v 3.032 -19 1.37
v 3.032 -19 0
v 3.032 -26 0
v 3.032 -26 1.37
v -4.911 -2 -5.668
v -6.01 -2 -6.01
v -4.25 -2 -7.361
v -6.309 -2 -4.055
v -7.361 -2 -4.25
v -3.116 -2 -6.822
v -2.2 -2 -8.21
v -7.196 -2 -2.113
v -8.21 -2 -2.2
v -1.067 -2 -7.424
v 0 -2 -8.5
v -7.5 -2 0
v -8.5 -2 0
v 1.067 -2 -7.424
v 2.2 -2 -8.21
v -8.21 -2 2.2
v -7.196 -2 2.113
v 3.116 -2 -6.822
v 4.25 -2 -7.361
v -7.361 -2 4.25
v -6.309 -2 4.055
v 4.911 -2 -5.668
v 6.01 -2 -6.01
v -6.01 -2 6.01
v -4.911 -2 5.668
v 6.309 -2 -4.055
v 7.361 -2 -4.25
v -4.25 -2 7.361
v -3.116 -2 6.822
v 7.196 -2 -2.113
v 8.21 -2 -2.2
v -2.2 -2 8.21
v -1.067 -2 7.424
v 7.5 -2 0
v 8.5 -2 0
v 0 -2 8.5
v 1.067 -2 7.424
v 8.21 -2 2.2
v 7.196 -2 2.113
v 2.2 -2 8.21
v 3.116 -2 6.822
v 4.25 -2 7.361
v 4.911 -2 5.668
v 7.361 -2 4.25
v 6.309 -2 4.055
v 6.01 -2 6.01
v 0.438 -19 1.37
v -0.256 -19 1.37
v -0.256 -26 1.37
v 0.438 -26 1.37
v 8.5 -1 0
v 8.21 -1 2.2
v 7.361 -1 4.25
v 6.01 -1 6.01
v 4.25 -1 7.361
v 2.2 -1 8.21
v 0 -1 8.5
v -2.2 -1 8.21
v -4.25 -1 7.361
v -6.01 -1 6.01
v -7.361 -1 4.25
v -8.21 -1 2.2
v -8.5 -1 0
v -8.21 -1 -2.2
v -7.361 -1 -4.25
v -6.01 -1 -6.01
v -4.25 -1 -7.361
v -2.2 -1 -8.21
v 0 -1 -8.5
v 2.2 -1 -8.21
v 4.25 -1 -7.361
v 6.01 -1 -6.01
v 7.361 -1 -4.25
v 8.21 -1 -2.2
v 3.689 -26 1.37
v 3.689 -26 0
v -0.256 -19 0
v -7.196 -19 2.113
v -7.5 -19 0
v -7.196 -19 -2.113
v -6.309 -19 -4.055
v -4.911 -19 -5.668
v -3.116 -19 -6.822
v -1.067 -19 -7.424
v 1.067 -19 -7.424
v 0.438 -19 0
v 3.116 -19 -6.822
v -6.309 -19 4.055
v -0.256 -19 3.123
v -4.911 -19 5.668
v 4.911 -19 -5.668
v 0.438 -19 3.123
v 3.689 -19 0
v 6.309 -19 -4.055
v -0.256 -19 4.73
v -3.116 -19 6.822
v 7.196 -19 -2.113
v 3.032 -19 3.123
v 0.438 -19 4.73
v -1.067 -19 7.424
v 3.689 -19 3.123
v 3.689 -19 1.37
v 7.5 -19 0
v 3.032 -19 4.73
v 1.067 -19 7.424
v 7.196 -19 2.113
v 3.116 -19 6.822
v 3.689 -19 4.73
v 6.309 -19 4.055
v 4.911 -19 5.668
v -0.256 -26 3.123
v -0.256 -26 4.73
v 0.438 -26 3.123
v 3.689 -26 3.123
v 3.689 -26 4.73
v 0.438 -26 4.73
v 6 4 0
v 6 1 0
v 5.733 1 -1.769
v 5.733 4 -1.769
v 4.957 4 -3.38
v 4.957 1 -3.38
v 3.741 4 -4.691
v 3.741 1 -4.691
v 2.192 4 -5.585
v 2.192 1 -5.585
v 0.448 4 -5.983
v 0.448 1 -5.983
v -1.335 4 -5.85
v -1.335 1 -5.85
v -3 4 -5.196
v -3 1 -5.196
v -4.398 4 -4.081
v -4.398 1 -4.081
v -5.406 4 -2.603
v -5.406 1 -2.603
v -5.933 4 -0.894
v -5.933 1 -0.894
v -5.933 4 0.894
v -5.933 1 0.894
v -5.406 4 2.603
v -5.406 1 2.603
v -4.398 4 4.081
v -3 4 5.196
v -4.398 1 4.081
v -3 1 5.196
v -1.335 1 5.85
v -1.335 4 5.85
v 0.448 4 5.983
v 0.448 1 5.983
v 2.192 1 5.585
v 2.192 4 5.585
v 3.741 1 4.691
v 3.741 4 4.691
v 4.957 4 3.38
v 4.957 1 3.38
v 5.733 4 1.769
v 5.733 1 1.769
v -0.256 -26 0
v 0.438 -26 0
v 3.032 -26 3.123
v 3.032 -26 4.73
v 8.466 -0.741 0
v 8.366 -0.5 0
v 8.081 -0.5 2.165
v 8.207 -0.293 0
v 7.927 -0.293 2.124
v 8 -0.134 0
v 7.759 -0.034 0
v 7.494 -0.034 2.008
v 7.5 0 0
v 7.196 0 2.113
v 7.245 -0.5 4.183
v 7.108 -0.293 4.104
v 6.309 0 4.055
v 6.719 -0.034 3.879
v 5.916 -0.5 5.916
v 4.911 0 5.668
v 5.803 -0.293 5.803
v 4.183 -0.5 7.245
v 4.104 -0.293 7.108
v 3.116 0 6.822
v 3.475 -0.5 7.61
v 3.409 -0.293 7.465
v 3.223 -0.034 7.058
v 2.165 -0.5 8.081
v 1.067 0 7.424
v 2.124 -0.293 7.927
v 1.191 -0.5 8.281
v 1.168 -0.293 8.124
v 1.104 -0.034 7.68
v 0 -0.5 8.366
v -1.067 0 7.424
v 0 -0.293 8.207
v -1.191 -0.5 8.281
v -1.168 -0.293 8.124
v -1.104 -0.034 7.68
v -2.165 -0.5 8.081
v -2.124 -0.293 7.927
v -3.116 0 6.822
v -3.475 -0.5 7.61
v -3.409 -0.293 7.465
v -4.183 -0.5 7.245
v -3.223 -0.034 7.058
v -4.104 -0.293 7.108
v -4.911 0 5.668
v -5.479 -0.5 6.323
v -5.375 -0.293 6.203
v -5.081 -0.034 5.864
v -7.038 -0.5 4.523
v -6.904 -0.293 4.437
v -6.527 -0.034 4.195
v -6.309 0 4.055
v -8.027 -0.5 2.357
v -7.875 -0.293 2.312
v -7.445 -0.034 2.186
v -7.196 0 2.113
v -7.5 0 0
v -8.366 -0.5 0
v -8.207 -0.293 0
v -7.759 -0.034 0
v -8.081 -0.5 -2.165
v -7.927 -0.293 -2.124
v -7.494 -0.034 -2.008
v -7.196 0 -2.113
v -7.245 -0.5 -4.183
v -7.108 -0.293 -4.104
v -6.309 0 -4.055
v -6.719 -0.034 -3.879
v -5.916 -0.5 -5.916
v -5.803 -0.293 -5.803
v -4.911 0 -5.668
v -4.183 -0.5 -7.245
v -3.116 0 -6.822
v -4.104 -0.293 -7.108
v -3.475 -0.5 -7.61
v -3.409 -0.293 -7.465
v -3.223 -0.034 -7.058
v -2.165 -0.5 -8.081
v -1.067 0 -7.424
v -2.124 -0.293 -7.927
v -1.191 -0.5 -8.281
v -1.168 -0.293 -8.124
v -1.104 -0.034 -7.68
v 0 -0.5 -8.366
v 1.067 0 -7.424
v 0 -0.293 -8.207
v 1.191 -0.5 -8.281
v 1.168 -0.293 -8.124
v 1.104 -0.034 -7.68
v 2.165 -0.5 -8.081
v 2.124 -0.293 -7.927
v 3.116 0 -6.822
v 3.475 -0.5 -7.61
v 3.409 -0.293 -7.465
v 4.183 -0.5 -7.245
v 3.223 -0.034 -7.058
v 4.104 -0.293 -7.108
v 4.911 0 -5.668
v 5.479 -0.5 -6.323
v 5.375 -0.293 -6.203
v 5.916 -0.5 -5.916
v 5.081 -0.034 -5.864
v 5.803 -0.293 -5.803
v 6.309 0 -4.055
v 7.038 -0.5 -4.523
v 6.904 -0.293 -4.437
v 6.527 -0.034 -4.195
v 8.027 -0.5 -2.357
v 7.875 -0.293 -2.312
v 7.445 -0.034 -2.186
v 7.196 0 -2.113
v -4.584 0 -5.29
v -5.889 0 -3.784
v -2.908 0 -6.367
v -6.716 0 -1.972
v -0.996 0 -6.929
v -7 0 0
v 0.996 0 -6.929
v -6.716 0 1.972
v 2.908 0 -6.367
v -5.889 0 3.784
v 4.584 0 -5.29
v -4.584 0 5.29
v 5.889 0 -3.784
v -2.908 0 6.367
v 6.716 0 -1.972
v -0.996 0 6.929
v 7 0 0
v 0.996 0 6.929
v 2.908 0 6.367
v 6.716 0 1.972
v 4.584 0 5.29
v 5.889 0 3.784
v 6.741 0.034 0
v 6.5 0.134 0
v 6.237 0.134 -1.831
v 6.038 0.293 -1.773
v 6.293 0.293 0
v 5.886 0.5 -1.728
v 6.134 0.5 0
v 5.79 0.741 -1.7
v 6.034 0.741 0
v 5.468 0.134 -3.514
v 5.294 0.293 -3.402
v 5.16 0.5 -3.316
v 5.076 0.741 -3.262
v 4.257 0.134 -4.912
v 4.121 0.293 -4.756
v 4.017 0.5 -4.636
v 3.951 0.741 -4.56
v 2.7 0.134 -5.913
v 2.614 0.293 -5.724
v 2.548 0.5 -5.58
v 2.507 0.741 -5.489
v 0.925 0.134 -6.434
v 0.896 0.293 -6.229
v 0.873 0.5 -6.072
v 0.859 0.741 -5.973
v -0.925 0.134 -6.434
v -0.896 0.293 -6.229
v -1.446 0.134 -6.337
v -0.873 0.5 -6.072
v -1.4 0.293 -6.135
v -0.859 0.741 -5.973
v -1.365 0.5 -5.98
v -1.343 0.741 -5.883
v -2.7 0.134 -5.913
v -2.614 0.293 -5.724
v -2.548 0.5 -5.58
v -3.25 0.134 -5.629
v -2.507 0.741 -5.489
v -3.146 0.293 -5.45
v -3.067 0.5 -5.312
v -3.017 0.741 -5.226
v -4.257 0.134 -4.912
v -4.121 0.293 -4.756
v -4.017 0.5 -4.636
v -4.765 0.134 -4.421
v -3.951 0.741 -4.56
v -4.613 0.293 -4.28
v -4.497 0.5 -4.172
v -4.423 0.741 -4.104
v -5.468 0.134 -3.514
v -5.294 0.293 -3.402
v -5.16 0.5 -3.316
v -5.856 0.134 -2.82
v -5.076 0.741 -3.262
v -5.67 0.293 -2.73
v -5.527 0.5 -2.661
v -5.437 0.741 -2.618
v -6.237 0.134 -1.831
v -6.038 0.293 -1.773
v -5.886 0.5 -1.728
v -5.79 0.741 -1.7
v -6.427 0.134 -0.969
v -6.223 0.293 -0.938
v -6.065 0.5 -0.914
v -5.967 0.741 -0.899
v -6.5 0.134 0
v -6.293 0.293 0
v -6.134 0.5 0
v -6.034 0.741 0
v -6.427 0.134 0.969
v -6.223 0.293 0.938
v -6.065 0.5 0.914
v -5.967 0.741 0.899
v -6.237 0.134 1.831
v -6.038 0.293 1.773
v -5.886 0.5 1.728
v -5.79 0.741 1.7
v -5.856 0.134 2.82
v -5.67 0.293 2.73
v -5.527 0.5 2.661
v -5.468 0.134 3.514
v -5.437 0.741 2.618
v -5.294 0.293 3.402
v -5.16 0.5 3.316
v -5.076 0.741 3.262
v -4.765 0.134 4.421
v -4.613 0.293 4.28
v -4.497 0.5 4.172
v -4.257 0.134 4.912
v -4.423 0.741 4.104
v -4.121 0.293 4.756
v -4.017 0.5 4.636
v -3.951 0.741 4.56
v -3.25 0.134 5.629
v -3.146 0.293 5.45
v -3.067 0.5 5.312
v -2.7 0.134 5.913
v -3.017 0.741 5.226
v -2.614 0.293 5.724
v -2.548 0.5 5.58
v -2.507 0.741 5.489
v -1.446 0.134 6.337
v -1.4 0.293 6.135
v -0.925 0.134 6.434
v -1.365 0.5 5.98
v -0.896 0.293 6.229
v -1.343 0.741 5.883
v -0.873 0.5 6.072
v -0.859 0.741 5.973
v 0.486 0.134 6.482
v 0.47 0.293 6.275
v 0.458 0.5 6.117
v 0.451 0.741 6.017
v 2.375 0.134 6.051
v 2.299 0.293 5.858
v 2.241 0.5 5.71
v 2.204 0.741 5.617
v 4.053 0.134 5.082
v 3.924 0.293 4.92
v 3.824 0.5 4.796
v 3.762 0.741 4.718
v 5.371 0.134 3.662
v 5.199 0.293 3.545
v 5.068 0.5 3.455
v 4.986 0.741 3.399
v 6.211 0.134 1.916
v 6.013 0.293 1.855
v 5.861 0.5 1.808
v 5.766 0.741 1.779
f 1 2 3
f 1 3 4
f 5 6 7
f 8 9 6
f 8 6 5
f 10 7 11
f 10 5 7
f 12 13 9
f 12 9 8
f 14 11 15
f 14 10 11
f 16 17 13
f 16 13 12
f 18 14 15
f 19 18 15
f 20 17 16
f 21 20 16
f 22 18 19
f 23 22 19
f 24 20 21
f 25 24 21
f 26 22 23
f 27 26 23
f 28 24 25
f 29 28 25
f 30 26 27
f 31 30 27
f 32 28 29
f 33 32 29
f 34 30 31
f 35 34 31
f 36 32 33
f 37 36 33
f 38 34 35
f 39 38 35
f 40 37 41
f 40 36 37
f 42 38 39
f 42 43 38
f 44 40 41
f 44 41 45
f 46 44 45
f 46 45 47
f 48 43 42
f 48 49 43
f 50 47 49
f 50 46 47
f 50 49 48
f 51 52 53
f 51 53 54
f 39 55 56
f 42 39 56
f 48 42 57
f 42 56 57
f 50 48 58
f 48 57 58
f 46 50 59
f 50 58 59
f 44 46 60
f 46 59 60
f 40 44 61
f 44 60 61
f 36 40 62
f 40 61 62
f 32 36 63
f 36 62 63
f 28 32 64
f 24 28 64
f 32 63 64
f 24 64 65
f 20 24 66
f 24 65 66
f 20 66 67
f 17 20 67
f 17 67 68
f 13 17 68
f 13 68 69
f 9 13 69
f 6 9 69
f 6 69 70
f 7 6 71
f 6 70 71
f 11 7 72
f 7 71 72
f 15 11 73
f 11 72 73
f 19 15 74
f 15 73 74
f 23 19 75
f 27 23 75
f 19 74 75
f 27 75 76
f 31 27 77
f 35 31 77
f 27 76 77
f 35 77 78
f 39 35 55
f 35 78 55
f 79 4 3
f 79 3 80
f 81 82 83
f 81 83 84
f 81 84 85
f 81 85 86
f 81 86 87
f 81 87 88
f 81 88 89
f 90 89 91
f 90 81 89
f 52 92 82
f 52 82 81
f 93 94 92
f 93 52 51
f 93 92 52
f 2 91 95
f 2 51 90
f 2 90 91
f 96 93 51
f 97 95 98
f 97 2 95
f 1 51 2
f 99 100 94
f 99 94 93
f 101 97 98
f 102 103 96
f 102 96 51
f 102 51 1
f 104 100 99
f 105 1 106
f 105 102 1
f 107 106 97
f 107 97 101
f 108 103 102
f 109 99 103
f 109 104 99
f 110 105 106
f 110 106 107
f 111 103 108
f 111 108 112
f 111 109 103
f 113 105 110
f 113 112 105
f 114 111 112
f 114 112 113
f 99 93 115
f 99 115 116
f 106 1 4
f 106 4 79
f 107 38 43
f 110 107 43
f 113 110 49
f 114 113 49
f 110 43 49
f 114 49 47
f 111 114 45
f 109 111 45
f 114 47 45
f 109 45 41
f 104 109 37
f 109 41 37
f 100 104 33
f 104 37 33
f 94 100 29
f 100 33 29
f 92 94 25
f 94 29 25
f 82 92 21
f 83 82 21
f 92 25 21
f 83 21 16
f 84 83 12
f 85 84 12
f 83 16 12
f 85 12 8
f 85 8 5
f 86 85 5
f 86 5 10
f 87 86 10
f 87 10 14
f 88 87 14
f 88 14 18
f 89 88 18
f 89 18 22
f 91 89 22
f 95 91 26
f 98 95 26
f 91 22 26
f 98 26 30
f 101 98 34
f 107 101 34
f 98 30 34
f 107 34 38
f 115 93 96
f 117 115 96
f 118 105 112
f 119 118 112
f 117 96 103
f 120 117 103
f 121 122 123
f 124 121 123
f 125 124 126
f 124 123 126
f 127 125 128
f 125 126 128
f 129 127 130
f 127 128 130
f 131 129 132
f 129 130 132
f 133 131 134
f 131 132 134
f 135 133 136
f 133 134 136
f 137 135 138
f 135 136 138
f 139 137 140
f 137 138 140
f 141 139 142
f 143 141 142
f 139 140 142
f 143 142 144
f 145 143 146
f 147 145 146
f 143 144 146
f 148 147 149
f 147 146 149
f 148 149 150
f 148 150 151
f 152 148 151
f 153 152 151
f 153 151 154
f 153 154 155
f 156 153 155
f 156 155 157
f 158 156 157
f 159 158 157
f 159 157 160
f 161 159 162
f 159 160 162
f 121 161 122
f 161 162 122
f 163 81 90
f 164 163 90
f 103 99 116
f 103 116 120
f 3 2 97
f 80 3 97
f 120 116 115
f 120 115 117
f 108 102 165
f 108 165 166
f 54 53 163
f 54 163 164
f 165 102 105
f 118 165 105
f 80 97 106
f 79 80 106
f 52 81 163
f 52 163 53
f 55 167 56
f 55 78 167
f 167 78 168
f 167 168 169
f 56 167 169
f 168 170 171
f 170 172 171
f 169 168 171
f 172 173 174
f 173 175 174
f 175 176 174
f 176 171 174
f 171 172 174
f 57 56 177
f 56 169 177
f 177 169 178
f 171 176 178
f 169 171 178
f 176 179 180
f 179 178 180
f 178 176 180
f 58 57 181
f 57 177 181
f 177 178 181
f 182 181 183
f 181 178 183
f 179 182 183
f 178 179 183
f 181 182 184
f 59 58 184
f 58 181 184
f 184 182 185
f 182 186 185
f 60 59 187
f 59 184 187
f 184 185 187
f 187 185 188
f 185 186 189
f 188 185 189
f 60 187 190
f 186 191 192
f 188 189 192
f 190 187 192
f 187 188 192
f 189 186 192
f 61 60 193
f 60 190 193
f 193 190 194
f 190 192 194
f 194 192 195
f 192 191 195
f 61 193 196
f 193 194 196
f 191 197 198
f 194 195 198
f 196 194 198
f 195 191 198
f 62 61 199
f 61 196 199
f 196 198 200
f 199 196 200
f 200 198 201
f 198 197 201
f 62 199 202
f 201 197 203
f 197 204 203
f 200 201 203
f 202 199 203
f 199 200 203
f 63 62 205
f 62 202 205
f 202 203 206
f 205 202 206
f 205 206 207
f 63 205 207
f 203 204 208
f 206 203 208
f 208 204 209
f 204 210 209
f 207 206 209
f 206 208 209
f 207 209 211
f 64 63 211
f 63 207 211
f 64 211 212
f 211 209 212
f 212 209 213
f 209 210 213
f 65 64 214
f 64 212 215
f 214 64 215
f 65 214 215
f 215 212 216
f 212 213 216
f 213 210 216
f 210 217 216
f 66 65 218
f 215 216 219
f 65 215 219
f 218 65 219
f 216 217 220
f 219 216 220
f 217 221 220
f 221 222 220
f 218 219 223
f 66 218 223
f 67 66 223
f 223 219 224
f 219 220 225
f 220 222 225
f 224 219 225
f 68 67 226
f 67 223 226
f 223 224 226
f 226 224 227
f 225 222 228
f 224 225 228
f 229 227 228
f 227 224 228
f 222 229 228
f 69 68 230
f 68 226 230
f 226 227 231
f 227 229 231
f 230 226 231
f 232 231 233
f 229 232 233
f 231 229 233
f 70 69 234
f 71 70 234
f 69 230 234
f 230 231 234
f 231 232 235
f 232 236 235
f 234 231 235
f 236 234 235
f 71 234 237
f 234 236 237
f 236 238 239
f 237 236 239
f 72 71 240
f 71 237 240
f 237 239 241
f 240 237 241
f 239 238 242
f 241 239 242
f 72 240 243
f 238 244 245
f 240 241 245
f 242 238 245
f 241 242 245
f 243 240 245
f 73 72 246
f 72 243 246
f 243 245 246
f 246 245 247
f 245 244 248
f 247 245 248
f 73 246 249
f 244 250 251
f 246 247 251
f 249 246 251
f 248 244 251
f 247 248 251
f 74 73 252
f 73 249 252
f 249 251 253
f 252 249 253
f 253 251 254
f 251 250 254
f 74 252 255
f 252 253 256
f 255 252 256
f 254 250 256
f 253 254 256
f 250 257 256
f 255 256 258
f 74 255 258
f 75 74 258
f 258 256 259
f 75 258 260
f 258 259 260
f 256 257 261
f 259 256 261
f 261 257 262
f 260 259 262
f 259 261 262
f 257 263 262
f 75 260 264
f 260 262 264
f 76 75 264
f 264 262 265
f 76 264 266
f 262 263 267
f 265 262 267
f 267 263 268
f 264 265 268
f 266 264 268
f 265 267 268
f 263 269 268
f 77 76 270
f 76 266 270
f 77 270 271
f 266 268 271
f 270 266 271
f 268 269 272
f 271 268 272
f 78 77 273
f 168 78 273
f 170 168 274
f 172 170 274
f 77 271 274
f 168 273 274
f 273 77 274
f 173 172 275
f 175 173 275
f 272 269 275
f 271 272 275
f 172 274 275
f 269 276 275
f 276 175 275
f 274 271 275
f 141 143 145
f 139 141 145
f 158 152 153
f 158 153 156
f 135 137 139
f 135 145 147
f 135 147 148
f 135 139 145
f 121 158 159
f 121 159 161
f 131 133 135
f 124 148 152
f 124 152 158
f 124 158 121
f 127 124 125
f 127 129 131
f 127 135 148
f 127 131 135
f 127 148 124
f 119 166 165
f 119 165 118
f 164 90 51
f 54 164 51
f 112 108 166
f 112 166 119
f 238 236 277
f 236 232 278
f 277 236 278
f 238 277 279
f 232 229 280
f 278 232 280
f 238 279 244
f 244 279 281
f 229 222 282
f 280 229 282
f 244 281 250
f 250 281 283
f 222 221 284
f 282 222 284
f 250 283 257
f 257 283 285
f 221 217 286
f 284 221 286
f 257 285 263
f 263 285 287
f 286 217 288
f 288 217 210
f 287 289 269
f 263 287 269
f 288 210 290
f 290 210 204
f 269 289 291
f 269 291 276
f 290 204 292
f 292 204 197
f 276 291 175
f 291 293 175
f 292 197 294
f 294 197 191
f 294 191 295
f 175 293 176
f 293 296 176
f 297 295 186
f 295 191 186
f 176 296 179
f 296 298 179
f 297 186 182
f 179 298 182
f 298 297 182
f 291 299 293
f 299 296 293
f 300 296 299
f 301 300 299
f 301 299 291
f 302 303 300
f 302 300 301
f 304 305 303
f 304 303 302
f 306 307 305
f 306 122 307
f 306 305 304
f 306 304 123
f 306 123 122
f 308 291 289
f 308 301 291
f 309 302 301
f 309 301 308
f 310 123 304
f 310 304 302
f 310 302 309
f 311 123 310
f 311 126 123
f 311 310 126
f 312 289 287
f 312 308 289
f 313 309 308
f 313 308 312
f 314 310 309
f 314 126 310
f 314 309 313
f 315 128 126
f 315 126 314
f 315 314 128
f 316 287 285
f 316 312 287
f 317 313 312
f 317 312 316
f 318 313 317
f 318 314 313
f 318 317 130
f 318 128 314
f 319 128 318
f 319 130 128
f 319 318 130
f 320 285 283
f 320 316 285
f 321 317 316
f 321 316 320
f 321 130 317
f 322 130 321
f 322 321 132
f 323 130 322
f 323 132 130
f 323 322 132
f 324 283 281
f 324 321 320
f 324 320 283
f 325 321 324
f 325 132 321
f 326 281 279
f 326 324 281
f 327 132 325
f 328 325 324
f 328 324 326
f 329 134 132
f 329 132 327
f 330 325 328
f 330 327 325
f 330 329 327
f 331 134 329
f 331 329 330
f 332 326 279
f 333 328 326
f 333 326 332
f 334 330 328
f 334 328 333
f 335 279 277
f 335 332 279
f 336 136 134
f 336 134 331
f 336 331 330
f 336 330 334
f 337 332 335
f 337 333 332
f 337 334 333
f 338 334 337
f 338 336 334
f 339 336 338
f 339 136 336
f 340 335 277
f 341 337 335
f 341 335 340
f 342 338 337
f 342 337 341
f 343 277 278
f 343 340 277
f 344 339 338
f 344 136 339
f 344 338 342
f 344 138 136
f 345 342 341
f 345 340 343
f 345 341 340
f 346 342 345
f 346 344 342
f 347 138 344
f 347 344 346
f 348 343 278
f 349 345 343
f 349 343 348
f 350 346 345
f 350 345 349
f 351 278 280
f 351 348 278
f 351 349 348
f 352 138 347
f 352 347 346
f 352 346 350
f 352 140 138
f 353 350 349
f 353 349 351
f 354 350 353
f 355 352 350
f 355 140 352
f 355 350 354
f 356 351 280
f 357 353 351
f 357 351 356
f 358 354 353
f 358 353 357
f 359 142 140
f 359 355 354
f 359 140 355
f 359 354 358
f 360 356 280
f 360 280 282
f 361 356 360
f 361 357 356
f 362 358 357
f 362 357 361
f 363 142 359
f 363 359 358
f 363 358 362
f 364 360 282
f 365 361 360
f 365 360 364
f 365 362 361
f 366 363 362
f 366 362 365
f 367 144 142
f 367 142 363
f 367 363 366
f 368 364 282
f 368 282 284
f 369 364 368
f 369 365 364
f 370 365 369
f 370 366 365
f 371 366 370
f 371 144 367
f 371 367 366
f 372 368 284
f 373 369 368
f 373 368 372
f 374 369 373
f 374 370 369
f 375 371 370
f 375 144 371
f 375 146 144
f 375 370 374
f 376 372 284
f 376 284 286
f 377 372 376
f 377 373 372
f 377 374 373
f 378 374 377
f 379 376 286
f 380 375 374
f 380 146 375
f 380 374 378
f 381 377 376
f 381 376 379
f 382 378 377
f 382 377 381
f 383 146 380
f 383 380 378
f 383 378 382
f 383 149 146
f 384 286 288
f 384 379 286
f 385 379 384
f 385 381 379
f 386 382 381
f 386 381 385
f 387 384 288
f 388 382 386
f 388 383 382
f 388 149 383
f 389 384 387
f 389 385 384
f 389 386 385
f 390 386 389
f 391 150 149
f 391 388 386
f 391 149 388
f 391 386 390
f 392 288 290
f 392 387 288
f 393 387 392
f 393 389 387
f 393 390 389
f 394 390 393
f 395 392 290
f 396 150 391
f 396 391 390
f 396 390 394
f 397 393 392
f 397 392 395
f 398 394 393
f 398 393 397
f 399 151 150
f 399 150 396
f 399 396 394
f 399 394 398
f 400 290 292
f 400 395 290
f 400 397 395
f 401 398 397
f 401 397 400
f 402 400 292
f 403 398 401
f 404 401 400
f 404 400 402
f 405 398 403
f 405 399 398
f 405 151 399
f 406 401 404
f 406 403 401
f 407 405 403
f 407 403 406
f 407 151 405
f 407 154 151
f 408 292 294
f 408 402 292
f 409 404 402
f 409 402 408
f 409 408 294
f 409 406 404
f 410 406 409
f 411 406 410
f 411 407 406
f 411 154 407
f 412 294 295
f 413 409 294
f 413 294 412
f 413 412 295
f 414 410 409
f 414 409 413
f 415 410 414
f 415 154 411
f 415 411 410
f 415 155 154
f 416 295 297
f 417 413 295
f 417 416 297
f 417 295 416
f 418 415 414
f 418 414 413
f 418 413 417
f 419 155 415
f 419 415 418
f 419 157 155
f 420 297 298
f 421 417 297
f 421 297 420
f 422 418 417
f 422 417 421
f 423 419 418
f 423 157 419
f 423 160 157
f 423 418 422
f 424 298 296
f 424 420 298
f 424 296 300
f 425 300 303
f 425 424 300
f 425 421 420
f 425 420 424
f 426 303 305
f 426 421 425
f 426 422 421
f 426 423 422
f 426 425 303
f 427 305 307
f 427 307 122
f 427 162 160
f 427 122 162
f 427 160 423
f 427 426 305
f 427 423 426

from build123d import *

# Parameters (mm, degrees)
IZIM1_R                     = 6
Y_KSEKLIK_EKSTR_ZYON1_DEPTH = 4
IZIM2_R                     = 8.5
Y_KSEKLIK_EKSTR_ZYON2_DEPTH = 2
RADYUS1_R                   = 1
IZIM3_R                     = 7.5
Y_KSEKLIK_EKSTR_ZYON3_DEPTH = 17
IZIM4_W                     = 0.657456129
IZIM4_H                     = 1.607114982
IZIM4_W_2                   = 0.693981469
IZIM4_H_2                   = 1.369700268
Y_KSEKLIK_EKSTR_ZYON4_DEPTH = 7


with BuildPart() as part:
    # Çizim1 → Yükseklik-Ekstrüzyon1 (new body)
    with BuildSketch(Plane(origin=(0, 0, 0), x_dir=(1, 0, 0), z_dir=(0, 1, 0))):
        Circle(IZIM1_R)
    extrude(amount=Y_KSEKLIK_EKSTR_ZYON1_DEPTH)

    # Çizim2 → Yükseklik-Ekstrüzyon2 (add)
    with BuildSketch(Plane.XZ):
        Circle(IZIM2_R)
    extrude(amount=Y_KSEKLIK_EKSTR_ZYON2_DEPTH)

    # Radyus1
    radyus1_edges = [part.edges().sort_by_distance(p)[0] for p in [
        (-8.5, 0, 0),
        (-6, 0, 0),
    ]]
    fillet(radyus1_edges, radius=RADYUS1_R)

    # Çizim3 → Yükseklik-Ekstrüzyon3 (add)
    with BuildSketch(Plane.XZ.offset(2)):
        Circle(IZIM3_R)
    extrude(amount=Y_KSEKLIK_EKSTR_ZYON3_DEPTH)

    # Çizim4 → Yükseklik-Ekstrüzyon4 (add)
    with BuildSketch(Plane.XZ.offset(19)):
        with Locations((3.360331326, 3.926474103)):
            Rectangle(IZIM4_W, IZIM4_H)
        with Locations((0.091313352, 3.926474103)):
            Rectangle(IZIM4_W_2, IZIM4_H)
        with Locations((3.360331326, 0.684850134)):
            Rectangle(IZIM4_W, IZIM4_H_2)
        with Locations((0.091313352, 0.684850134)):
            Rectangle(IZIM4_W_2, IZIM4_H_2)
    extrude(amount=Y_KSEKLIK_EKSTR_ZYON4_DEPTH)


solid = part.part
